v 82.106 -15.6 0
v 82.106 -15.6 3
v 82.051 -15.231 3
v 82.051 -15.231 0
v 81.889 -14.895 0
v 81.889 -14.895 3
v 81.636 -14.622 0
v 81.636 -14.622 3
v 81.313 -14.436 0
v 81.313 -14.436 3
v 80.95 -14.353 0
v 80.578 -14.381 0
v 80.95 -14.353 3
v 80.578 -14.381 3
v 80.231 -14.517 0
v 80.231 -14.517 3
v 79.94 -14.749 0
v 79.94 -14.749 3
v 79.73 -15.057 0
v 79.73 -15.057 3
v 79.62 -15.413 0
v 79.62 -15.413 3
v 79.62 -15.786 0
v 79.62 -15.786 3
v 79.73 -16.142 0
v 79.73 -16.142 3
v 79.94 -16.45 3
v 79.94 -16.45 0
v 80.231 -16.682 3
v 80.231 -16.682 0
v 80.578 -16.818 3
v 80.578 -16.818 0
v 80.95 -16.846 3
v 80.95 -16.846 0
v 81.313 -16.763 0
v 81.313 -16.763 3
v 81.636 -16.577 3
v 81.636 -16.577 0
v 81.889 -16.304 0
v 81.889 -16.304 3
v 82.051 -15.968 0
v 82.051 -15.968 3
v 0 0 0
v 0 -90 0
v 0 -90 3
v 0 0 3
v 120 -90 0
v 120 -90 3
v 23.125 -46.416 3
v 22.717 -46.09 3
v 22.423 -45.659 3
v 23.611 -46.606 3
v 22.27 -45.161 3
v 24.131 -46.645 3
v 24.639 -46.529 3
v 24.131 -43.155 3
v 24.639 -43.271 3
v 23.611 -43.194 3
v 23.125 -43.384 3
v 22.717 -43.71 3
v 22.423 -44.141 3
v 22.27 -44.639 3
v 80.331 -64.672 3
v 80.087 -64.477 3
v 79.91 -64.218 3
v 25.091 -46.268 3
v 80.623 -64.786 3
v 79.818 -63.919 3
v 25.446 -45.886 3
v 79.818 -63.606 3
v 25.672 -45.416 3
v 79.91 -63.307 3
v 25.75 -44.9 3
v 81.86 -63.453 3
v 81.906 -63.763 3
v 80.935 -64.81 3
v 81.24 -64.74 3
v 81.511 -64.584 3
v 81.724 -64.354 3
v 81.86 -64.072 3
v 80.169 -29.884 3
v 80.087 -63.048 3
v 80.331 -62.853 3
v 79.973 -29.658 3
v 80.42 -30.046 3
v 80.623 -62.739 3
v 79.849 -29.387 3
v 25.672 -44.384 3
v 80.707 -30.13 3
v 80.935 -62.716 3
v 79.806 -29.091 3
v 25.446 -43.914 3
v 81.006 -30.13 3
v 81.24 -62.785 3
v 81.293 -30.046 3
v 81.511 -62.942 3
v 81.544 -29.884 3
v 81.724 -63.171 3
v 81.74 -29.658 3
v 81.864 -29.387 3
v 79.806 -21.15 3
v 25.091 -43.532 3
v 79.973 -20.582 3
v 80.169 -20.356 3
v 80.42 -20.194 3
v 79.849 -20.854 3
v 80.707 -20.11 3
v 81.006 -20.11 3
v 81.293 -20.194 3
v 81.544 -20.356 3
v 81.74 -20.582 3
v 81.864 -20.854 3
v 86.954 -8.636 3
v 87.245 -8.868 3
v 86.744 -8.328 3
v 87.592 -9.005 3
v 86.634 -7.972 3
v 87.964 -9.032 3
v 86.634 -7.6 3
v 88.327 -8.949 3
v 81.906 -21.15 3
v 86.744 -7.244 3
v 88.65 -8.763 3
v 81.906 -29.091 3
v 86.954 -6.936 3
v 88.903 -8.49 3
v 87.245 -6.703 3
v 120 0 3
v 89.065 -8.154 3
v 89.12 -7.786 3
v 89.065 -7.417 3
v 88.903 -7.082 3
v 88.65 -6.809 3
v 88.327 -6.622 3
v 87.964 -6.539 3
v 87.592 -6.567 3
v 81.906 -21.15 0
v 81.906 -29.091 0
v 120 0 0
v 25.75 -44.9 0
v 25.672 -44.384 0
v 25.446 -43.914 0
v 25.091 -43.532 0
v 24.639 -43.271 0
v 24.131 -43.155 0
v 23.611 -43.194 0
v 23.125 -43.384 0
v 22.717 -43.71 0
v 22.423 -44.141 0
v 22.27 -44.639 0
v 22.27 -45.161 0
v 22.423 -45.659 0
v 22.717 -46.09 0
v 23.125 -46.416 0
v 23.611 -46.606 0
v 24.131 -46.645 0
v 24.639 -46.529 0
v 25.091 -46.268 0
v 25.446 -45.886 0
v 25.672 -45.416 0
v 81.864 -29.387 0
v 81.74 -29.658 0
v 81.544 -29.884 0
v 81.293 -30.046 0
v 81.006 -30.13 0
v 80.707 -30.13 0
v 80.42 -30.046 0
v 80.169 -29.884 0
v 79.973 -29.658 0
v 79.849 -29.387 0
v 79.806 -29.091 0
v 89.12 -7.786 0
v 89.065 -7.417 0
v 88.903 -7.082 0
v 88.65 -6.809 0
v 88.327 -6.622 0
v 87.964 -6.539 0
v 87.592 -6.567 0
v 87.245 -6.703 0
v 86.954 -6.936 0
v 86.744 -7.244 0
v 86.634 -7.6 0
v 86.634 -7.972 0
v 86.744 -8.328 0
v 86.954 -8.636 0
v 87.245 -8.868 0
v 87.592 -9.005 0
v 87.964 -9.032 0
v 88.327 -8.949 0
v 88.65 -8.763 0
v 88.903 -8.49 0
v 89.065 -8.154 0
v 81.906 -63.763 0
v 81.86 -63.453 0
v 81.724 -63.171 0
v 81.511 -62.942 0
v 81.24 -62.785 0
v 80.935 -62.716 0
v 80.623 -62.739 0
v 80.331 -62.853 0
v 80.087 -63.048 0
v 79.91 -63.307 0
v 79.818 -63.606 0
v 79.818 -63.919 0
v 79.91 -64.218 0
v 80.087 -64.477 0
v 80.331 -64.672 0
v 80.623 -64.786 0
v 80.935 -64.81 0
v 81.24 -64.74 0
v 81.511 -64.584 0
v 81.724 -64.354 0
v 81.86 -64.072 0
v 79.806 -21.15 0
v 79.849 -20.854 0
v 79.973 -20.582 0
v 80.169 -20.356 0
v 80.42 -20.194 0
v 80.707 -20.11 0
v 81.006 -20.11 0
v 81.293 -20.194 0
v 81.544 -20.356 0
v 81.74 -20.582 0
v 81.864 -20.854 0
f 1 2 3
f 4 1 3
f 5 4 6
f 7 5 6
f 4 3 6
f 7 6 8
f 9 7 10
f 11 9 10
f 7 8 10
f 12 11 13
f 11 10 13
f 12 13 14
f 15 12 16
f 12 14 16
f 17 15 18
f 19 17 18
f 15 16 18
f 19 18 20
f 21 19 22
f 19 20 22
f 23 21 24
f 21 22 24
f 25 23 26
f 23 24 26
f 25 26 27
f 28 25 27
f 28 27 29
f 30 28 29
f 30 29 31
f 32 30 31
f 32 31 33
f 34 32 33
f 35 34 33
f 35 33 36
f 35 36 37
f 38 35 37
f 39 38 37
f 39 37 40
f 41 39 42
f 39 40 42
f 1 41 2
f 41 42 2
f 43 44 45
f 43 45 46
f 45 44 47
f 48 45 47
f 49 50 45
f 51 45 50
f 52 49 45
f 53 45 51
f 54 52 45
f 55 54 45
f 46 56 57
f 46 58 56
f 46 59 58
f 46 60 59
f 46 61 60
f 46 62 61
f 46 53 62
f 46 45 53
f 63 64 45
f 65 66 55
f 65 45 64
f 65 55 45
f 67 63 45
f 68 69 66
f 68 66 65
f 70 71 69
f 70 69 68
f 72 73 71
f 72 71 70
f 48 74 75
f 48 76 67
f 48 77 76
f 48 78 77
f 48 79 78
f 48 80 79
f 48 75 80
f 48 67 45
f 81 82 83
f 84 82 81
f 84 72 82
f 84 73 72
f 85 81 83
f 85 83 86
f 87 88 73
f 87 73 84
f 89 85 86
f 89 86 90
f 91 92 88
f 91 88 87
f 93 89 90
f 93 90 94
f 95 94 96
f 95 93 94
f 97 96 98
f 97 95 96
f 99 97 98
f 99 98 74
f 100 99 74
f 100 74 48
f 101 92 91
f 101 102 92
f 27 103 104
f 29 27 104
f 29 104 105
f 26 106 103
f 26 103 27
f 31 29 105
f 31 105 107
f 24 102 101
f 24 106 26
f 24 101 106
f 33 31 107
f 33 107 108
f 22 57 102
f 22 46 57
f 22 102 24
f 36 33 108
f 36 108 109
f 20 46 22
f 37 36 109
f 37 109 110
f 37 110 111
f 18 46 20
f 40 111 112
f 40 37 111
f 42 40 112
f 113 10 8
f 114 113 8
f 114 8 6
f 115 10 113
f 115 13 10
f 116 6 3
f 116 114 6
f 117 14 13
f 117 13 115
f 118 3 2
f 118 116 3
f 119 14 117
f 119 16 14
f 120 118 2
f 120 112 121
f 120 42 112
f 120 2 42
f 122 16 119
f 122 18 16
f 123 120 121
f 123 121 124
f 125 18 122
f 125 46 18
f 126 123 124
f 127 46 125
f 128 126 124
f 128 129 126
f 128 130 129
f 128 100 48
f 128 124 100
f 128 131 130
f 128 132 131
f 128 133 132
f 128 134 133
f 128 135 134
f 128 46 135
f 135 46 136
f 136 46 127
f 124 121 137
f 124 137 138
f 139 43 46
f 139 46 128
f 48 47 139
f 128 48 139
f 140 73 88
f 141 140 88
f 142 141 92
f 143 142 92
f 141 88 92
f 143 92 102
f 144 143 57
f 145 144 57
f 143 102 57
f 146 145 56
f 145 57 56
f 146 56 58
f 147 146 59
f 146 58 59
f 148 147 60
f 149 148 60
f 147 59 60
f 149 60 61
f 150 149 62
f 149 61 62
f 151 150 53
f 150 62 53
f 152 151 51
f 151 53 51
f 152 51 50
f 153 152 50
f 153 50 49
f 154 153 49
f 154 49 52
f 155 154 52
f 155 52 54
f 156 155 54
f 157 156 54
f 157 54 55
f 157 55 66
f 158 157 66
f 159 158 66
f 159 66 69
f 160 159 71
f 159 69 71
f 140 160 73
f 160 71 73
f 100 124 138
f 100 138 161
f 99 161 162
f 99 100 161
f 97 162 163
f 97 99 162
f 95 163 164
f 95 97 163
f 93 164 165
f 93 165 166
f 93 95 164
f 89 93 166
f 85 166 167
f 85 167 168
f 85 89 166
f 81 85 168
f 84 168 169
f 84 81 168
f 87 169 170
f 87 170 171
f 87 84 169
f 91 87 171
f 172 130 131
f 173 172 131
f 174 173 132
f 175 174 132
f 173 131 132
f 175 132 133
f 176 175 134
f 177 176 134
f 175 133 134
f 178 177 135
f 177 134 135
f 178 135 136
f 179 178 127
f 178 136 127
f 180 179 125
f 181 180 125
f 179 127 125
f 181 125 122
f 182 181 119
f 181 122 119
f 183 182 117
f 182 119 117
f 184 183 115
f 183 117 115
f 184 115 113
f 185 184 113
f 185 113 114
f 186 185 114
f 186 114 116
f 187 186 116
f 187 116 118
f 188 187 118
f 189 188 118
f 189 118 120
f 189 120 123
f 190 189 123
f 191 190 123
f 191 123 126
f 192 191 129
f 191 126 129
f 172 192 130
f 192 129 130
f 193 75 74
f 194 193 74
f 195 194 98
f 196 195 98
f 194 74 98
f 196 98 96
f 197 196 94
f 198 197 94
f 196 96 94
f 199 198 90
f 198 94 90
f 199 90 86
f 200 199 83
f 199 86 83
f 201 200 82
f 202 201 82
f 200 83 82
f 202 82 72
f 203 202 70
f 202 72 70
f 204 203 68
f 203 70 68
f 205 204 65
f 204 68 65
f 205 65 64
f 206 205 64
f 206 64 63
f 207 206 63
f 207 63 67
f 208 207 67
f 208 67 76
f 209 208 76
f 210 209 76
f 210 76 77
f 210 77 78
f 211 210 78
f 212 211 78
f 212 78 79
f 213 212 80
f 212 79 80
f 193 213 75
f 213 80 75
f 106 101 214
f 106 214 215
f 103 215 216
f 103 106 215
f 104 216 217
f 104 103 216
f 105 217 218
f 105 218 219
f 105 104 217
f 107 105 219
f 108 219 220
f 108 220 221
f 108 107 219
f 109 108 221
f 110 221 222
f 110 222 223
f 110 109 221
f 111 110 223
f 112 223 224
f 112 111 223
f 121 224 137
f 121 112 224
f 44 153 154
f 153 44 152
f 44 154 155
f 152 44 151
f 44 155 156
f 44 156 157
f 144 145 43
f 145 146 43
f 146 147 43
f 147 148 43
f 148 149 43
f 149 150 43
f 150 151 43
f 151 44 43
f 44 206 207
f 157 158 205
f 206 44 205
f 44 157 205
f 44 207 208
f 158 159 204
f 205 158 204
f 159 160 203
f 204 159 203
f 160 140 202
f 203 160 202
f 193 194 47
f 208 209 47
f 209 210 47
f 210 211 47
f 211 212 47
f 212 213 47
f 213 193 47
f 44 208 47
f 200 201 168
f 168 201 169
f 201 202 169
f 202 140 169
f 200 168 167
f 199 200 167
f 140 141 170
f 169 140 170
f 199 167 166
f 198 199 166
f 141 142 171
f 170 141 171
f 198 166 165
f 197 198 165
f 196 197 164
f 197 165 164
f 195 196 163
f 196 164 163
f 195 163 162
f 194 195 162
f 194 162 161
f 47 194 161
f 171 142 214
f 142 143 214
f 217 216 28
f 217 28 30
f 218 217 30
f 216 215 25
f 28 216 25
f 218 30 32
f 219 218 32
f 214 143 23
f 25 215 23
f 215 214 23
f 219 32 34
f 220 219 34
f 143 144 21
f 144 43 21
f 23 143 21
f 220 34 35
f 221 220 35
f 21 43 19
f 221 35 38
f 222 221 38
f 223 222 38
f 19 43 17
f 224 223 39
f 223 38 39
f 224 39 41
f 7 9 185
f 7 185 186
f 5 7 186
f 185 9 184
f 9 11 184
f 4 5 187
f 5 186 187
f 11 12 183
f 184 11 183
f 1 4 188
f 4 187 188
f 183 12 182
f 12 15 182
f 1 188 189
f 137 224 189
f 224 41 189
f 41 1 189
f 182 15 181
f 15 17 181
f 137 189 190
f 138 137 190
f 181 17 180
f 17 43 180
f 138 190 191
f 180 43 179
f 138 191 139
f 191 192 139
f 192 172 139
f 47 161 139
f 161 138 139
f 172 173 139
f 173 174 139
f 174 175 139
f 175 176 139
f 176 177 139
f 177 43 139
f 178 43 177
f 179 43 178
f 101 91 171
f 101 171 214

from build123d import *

# Parameters (mm, degrees)
SKETCH1_W           = 120
SKETCH1_H           = 90
BOSS_EXTRUDE1_DEPTH = 3
SKETCH3_R           = 1.75
SKETCH3_R_2         = 1.05
CUT_EXTRUDE1_DEPTH  = 3
SKETCH7_R           = 1.25
CUT_EXTRUDE3_DEPTH  = 3


with BuildPart() as part:
    # Sketch1 → Boss-Extrude1 (new body)
    with BuildSketch(Plane.XY):
        with Locations((60, -45)):
            Rectangle(SKETCH1_W, SKETCH1_H)
    extrude(amount=BOSS_EXTRUDE1_DEPTH)

    # Sketch3 → Cut-Extrude1 (cut)
    with BuildSketch(Plane.XY.offset(3)):
        with Locations((24, -44.9)):
            Circle(SKETCH3_R)
        with Locations((80.856366148, -63.762627499)):
            Circle(SKETCH3_R_2)
        with BuildLine():
            Line((79.806366148, -29.090746885), (79.806366148, -21.14956271))
            ThreePointArc((79.806366148, -21.14956271), (80.856366148, -20.09956271), (81.906366148, -21.14956271))
            Line((81.906366148, -21.14956271), (81.906366148, -29.090746885))
            ThreePointArc((81.906366148, -29.090746885), (80.856366148, -30.140746885), (79.806366148, -29.090746885))
        make_face()
    extrude(amount=-CUT_EXTRUDE1_DEPTH, mode=Mode.SUBTRACT)

    # Sketch7 → Cut-Extrude3 (cut)
    with BuildSketch(Plane.XY.offset(3)):
        with Locations((80.856366148, -15.59956271)):
            Circle(SKETCH7_R)
        with Locations((87.870361331, -7.785865021)):
            Circle(SKETCH7_R)
    extrude(amount=-CUT_EXTRUDE3_DEPTH, mode=Mode.SUBTRACT)


solid = part.part
